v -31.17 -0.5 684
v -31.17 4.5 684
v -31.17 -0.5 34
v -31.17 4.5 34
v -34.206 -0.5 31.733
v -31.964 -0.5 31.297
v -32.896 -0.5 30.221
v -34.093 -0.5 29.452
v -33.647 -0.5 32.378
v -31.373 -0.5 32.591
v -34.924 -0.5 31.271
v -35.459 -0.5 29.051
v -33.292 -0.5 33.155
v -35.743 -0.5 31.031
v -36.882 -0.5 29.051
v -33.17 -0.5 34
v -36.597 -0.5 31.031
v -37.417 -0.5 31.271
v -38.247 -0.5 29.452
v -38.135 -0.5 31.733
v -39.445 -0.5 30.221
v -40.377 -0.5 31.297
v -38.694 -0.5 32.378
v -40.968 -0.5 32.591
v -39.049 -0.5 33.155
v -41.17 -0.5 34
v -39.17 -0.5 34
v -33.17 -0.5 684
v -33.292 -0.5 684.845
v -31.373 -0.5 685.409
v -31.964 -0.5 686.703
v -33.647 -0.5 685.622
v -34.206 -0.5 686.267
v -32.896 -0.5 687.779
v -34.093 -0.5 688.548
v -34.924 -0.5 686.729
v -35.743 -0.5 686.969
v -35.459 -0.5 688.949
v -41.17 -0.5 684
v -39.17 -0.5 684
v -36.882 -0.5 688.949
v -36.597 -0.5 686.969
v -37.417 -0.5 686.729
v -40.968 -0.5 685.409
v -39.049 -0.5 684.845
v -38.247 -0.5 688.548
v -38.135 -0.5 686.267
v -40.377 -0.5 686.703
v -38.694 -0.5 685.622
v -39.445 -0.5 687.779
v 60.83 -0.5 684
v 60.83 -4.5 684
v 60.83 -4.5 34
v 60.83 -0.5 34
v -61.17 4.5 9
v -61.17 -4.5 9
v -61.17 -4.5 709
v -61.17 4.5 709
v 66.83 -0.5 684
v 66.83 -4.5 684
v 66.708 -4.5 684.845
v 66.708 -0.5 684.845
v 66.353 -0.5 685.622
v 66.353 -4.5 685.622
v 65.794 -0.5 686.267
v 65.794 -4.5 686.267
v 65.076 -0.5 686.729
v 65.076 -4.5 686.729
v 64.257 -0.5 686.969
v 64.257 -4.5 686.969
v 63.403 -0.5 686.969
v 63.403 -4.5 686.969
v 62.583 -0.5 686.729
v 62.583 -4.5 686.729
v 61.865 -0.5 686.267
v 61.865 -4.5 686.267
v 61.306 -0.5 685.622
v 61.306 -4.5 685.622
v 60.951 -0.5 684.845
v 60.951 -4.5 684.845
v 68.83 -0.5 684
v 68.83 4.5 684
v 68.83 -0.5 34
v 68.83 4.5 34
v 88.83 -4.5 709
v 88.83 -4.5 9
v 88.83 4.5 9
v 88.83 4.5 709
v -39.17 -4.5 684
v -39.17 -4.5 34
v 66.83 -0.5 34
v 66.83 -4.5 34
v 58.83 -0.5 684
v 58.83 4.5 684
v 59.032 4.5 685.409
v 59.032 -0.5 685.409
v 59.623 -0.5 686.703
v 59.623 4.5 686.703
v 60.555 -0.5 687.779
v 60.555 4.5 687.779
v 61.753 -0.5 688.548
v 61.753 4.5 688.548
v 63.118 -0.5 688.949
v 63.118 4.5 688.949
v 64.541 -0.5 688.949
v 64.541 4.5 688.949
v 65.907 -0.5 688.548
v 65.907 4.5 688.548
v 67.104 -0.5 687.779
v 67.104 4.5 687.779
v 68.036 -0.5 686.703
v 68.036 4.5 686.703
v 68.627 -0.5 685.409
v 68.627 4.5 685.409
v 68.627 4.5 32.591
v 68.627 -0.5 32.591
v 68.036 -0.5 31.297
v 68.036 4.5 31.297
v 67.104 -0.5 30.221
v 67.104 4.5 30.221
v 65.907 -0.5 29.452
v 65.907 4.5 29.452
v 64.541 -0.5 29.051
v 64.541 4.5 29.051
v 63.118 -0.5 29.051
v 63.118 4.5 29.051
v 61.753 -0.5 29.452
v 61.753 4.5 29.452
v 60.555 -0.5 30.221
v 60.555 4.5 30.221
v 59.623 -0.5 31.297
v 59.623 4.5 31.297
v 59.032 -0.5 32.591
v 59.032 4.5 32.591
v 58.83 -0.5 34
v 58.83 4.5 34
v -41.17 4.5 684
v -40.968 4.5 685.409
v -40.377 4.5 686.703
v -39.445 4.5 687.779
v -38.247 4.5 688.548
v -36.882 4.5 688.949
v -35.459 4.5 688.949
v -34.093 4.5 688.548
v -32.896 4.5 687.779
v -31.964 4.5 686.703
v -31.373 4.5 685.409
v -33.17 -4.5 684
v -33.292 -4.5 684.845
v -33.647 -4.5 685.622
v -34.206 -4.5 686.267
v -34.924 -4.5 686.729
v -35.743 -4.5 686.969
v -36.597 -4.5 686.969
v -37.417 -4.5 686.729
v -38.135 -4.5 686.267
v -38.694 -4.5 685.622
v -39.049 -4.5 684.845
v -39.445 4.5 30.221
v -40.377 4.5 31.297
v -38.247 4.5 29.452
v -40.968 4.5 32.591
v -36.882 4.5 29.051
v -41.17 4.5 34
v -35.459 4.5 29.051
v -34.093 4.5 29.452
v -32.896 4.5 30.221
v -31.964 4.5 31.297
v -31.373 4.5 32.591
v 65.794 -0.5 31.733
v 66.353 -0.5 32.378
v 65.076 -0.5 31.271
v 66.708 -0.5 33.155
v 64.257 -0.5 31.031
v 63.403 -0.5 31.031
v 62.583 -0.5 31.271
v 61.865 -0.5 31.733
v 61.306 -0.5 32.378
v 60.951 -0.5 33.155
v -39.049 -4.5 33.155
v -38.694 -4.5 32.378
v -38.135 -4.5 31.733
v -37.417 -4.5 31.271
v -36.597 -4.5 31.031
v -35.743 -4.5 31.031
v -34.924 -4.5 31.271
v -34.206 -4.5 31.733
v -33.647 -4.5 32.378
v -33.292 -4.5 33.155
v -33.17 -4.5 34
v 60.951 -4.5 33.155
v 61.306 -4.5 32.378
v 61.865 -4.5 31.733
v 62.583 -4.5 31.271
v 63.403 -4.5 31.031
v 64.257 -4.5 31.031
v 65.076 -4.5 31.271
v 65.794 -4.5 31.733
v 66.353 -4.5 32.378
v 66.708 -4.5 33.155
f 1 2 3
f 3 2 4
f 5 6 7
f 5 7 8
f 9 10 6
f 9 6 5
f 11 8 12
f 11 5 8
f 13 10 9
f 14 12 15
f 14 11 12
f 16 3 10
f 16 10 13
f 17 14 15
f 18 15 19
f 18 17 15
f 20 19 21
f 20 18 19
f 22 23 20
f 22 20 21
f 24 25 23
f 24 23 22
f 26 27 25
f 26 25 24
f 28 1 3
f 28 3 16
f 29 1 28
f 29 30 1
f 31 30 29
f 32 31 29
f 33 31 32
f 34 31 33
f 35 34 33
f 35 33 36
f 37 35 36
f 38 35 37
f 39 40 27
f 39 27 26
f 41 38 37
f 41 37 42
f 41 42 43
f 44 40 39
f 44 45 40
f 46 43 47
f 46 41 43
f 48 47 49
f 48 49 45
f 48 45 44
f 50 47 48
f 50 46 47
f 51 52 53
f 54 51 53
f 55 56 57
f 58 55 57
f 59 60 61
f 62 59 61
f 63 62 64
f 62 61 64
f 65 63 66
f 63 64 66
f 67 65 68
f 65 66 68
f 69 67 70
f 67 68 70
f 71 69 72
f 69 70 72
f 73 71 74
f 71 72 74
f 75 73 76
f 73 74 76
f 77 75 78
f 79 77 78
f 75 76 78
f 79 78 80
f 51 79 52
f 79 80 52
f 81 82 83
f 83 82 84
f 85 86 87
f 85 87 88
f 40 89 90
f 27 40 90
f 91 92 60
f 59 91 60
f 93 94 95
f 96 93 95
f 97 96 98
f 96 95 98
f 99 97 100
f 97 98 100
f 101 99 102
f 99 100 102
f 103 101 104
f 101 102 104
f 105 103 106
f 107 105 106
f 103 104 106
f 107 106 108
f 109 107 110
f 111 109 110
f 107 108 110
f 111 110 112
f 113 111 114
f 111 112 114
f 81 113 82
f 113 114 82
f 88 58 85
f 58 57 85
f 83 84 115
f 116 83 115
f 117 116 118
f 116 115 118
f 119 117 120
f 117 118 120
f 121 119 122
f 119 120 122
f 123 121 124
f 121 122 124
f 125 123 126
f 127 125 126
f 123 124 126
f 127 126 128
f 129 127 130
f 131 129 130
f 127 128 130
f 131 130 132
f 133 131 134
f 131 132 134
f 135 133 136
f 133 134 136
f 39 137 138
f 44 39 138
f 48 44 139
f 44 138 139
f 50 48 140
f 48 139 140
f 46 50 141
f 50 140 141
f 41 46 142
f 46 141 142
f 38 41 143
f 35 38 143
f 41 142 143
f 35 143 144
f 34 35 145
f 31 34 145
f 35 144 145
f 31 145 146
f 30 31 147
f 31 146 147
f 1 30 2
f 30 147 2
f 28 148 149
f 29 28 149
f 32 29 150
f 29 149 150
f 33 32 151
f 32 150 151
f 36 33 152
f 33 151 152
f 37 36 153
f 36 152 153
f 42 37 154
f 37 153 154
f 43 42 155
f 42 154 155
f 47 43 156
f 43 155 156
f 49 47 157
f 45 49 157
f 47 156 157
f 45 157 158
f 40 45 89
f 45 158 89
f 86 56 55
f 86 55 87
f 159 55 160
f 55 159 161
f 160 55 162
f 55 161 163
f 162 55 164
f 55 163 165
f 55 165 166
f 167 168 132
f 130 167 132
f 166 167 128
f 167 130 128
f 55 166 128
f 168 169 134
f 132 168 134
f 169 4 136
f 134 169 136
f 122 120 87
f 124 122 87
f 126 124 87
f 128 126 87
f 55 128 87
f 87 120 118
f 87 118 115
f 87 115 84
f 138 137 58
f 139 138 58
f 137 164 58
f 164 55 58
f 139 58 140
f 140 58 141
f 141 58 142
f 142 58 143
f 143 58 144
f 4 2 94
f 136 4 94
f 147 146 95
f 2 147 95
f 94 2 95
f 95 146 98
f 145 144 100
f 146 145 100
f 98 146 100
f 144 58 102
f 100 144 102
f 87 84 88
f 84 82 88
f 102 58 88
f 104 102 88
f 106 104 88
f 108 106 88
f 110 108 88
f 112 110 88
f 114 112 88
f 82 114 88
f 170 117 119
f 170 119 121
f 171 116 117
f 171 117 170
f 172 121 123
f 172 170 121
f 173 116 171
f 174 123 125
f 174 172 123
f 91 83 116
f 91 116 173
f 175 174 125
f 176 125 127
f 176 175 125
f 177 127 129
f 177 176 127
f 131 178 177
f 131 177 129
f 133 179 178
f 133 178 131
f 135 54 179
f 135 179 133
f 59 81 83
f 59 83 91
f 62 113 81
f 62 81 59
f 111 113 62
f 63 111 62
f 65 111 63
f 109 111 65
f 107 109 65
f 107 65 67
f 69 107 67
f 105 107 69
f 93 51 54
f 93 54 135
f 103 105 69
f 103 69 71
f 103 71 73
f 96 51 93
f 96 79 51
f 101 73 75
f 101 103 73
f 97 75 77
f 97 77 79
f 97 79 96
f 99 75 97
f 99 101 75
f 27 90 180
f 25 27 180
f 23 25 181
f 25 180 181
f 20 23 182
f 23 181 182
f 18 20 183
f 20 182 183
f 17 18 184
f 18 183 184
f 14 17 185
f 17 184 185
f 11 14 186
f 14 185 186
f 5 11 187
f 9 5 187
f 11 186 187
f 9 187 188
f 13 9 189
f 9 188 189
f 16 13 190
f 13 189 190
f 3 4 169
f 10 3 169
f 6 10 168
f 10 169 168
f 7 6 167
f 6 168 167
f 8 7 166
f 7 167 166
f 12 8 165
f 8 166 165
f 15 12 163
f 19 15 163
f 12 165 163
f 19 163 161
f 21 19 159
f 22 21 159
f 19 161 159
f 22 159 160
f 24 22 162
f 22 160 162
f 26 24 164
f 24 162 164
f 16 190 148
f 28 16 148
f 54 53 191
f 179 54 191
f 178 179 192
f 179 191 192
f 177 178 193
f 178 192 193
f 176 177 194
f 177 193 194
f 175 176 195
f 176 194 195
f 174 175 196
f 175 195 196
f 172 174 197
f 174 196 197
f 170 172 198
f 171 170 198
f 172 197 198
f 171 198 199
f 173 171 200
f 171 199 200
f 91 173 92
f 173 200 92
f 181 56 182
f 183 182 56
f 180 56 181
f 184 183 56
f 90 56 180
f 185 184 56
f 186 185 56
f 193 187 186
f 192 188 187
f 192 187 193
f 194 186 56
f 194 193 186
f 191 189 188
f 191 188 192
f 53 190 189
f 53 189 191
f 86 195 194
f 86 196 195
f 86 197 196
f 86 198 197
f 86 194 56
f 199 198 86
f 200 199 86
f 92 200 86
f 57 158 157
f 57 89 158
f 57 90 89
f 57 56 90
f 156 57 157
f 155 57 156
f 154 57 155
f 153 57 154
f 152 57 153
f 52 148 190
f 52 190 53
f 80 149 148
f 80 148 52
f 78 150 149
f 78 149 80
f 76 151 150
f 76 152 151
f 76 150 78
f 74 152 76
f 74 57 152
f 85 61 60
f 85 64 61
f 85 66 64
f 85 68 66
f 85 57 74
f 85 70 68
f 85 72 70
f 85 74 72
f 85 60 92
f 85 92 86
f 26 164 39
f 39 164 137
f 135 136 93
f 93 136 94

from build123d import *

# Parameters (mm, degrees)
F0_W     = 150
F0_H     = 700
F1_DEPTH = 4.5
F3_DEPTH = 9.001
F5_DEPTH = 5


with BuildPart() as f1:
    # F0 (on Front) → F1 (new body, symmetric)
    with BuildSketch(Plane.XZ):
        with Locations((13.8296149671, 359)):
            Rectangle(F0_W, F0_H)
    extrude(amount=F1_DEPTH, both=True)

    # F2 (on face) → F3 (cut, through all)
    with BuildSketch(Plane.XZ.offset(4.5)):
        with BuildLine():
            ThreePointArc((-39.1703850329, 684), (-36.1703850329, 681), (-33.1703850329, 684))
            ThreePointArc((-33.1703850329, 684), (-36.1703850329, 687), (-39.1703850329, 684))
        make_face()
        with BuildLine():
            Line((-33.1703850329, 34), (-33.1703850329, 684))
            ThreePointArc((-33.1703850329, 684), (-36.1703850329, 681), (-39.1703850329, 684))
            Line((-39.1703850329, 684), (-39.1703850329, 34))
            ThreePointArc((-39.1703850329, 34), (-36.1703850329, 37), (-33.1703850329, 34))
        make_face()
        with BuildLine():
            ThreePointArc((-39.1703850329, 34), (-36.1703850329, 31), (-33.1703850329, 34))
            ThreePointArc((-33.1703850329, 34), (-36.1703850329, 37), (-39.1703850329, 34))
        make_face()
        with BuildLine():
            ThreePointArc((60.8296149671, 684), (63.8296149671, 681), (66.8296149671, 684))
            ThreePointArc((66.8296149671, 684), (63.8296149671, 687), (60.8296149671, 684))
        make_face()
        with BuildLine():
            Line((66.8296149671, 34), (66.8296149671, 684))
            ThreePointArc((66.8296149671, 684), (63.8296149671, 681), (60.8296149671, 684))
            Line((60.8296149671, 684), (60.8296149671, 34))
            ThreePointArc((60.8296149671, 34), (63.8296149671, 37), (66.8296149671, 34))
        make_face()
        with BuildLine():
            ThreePointArc((60.8296149671, 34), (63.8296149671, 31), (66.8296149671, 34))
            ThreePointArc((66.8296149671, 34), (63.8296149671, 37), (60.8296149671, 34))
        make_face()
    extrude(amount=-F3_DEPTH, mode=Mode.SUBTRACT)

    # F4 (on face) → F5 (cut)
    with BuildSketch(Plane(origin=(0, 4.5, 0), x_dir=(-1, 0, 0), z_dir=(0, 1, 0))):
        with BuildLine():
            Line((31.1703850329, 684), (31.1703850329, 34))
            ThreePointArc((31.1703850329, 34), (36.1703850329, 29), (41.1703850329, 34))
            Line((41.1703850329, 34), (41.1703850329, 684))
            ThreePointArc((41.1703850329, 684), (36.1703850329, 689), (31.1703850329, 684))
        make_face()
        with BuildLine():
            ThreePointArc((-68.8296149671, 34), (-63.8296149671, 29), (-58.8296149671, 34))
            Line((-58.8296149671, 34), (-58.8296149671, 684))
            ThreePointArc((-58.8296149671, 684), (-63.8296149671, 689), (-68.8296149671, 684))
            Line((-68.8296149671, 684), (-68.8296149671, 34))
        make_face()
    extrude(amount=-F5_DEPTH, mode=Mode.SUBTRACT)


solid = f1.part
